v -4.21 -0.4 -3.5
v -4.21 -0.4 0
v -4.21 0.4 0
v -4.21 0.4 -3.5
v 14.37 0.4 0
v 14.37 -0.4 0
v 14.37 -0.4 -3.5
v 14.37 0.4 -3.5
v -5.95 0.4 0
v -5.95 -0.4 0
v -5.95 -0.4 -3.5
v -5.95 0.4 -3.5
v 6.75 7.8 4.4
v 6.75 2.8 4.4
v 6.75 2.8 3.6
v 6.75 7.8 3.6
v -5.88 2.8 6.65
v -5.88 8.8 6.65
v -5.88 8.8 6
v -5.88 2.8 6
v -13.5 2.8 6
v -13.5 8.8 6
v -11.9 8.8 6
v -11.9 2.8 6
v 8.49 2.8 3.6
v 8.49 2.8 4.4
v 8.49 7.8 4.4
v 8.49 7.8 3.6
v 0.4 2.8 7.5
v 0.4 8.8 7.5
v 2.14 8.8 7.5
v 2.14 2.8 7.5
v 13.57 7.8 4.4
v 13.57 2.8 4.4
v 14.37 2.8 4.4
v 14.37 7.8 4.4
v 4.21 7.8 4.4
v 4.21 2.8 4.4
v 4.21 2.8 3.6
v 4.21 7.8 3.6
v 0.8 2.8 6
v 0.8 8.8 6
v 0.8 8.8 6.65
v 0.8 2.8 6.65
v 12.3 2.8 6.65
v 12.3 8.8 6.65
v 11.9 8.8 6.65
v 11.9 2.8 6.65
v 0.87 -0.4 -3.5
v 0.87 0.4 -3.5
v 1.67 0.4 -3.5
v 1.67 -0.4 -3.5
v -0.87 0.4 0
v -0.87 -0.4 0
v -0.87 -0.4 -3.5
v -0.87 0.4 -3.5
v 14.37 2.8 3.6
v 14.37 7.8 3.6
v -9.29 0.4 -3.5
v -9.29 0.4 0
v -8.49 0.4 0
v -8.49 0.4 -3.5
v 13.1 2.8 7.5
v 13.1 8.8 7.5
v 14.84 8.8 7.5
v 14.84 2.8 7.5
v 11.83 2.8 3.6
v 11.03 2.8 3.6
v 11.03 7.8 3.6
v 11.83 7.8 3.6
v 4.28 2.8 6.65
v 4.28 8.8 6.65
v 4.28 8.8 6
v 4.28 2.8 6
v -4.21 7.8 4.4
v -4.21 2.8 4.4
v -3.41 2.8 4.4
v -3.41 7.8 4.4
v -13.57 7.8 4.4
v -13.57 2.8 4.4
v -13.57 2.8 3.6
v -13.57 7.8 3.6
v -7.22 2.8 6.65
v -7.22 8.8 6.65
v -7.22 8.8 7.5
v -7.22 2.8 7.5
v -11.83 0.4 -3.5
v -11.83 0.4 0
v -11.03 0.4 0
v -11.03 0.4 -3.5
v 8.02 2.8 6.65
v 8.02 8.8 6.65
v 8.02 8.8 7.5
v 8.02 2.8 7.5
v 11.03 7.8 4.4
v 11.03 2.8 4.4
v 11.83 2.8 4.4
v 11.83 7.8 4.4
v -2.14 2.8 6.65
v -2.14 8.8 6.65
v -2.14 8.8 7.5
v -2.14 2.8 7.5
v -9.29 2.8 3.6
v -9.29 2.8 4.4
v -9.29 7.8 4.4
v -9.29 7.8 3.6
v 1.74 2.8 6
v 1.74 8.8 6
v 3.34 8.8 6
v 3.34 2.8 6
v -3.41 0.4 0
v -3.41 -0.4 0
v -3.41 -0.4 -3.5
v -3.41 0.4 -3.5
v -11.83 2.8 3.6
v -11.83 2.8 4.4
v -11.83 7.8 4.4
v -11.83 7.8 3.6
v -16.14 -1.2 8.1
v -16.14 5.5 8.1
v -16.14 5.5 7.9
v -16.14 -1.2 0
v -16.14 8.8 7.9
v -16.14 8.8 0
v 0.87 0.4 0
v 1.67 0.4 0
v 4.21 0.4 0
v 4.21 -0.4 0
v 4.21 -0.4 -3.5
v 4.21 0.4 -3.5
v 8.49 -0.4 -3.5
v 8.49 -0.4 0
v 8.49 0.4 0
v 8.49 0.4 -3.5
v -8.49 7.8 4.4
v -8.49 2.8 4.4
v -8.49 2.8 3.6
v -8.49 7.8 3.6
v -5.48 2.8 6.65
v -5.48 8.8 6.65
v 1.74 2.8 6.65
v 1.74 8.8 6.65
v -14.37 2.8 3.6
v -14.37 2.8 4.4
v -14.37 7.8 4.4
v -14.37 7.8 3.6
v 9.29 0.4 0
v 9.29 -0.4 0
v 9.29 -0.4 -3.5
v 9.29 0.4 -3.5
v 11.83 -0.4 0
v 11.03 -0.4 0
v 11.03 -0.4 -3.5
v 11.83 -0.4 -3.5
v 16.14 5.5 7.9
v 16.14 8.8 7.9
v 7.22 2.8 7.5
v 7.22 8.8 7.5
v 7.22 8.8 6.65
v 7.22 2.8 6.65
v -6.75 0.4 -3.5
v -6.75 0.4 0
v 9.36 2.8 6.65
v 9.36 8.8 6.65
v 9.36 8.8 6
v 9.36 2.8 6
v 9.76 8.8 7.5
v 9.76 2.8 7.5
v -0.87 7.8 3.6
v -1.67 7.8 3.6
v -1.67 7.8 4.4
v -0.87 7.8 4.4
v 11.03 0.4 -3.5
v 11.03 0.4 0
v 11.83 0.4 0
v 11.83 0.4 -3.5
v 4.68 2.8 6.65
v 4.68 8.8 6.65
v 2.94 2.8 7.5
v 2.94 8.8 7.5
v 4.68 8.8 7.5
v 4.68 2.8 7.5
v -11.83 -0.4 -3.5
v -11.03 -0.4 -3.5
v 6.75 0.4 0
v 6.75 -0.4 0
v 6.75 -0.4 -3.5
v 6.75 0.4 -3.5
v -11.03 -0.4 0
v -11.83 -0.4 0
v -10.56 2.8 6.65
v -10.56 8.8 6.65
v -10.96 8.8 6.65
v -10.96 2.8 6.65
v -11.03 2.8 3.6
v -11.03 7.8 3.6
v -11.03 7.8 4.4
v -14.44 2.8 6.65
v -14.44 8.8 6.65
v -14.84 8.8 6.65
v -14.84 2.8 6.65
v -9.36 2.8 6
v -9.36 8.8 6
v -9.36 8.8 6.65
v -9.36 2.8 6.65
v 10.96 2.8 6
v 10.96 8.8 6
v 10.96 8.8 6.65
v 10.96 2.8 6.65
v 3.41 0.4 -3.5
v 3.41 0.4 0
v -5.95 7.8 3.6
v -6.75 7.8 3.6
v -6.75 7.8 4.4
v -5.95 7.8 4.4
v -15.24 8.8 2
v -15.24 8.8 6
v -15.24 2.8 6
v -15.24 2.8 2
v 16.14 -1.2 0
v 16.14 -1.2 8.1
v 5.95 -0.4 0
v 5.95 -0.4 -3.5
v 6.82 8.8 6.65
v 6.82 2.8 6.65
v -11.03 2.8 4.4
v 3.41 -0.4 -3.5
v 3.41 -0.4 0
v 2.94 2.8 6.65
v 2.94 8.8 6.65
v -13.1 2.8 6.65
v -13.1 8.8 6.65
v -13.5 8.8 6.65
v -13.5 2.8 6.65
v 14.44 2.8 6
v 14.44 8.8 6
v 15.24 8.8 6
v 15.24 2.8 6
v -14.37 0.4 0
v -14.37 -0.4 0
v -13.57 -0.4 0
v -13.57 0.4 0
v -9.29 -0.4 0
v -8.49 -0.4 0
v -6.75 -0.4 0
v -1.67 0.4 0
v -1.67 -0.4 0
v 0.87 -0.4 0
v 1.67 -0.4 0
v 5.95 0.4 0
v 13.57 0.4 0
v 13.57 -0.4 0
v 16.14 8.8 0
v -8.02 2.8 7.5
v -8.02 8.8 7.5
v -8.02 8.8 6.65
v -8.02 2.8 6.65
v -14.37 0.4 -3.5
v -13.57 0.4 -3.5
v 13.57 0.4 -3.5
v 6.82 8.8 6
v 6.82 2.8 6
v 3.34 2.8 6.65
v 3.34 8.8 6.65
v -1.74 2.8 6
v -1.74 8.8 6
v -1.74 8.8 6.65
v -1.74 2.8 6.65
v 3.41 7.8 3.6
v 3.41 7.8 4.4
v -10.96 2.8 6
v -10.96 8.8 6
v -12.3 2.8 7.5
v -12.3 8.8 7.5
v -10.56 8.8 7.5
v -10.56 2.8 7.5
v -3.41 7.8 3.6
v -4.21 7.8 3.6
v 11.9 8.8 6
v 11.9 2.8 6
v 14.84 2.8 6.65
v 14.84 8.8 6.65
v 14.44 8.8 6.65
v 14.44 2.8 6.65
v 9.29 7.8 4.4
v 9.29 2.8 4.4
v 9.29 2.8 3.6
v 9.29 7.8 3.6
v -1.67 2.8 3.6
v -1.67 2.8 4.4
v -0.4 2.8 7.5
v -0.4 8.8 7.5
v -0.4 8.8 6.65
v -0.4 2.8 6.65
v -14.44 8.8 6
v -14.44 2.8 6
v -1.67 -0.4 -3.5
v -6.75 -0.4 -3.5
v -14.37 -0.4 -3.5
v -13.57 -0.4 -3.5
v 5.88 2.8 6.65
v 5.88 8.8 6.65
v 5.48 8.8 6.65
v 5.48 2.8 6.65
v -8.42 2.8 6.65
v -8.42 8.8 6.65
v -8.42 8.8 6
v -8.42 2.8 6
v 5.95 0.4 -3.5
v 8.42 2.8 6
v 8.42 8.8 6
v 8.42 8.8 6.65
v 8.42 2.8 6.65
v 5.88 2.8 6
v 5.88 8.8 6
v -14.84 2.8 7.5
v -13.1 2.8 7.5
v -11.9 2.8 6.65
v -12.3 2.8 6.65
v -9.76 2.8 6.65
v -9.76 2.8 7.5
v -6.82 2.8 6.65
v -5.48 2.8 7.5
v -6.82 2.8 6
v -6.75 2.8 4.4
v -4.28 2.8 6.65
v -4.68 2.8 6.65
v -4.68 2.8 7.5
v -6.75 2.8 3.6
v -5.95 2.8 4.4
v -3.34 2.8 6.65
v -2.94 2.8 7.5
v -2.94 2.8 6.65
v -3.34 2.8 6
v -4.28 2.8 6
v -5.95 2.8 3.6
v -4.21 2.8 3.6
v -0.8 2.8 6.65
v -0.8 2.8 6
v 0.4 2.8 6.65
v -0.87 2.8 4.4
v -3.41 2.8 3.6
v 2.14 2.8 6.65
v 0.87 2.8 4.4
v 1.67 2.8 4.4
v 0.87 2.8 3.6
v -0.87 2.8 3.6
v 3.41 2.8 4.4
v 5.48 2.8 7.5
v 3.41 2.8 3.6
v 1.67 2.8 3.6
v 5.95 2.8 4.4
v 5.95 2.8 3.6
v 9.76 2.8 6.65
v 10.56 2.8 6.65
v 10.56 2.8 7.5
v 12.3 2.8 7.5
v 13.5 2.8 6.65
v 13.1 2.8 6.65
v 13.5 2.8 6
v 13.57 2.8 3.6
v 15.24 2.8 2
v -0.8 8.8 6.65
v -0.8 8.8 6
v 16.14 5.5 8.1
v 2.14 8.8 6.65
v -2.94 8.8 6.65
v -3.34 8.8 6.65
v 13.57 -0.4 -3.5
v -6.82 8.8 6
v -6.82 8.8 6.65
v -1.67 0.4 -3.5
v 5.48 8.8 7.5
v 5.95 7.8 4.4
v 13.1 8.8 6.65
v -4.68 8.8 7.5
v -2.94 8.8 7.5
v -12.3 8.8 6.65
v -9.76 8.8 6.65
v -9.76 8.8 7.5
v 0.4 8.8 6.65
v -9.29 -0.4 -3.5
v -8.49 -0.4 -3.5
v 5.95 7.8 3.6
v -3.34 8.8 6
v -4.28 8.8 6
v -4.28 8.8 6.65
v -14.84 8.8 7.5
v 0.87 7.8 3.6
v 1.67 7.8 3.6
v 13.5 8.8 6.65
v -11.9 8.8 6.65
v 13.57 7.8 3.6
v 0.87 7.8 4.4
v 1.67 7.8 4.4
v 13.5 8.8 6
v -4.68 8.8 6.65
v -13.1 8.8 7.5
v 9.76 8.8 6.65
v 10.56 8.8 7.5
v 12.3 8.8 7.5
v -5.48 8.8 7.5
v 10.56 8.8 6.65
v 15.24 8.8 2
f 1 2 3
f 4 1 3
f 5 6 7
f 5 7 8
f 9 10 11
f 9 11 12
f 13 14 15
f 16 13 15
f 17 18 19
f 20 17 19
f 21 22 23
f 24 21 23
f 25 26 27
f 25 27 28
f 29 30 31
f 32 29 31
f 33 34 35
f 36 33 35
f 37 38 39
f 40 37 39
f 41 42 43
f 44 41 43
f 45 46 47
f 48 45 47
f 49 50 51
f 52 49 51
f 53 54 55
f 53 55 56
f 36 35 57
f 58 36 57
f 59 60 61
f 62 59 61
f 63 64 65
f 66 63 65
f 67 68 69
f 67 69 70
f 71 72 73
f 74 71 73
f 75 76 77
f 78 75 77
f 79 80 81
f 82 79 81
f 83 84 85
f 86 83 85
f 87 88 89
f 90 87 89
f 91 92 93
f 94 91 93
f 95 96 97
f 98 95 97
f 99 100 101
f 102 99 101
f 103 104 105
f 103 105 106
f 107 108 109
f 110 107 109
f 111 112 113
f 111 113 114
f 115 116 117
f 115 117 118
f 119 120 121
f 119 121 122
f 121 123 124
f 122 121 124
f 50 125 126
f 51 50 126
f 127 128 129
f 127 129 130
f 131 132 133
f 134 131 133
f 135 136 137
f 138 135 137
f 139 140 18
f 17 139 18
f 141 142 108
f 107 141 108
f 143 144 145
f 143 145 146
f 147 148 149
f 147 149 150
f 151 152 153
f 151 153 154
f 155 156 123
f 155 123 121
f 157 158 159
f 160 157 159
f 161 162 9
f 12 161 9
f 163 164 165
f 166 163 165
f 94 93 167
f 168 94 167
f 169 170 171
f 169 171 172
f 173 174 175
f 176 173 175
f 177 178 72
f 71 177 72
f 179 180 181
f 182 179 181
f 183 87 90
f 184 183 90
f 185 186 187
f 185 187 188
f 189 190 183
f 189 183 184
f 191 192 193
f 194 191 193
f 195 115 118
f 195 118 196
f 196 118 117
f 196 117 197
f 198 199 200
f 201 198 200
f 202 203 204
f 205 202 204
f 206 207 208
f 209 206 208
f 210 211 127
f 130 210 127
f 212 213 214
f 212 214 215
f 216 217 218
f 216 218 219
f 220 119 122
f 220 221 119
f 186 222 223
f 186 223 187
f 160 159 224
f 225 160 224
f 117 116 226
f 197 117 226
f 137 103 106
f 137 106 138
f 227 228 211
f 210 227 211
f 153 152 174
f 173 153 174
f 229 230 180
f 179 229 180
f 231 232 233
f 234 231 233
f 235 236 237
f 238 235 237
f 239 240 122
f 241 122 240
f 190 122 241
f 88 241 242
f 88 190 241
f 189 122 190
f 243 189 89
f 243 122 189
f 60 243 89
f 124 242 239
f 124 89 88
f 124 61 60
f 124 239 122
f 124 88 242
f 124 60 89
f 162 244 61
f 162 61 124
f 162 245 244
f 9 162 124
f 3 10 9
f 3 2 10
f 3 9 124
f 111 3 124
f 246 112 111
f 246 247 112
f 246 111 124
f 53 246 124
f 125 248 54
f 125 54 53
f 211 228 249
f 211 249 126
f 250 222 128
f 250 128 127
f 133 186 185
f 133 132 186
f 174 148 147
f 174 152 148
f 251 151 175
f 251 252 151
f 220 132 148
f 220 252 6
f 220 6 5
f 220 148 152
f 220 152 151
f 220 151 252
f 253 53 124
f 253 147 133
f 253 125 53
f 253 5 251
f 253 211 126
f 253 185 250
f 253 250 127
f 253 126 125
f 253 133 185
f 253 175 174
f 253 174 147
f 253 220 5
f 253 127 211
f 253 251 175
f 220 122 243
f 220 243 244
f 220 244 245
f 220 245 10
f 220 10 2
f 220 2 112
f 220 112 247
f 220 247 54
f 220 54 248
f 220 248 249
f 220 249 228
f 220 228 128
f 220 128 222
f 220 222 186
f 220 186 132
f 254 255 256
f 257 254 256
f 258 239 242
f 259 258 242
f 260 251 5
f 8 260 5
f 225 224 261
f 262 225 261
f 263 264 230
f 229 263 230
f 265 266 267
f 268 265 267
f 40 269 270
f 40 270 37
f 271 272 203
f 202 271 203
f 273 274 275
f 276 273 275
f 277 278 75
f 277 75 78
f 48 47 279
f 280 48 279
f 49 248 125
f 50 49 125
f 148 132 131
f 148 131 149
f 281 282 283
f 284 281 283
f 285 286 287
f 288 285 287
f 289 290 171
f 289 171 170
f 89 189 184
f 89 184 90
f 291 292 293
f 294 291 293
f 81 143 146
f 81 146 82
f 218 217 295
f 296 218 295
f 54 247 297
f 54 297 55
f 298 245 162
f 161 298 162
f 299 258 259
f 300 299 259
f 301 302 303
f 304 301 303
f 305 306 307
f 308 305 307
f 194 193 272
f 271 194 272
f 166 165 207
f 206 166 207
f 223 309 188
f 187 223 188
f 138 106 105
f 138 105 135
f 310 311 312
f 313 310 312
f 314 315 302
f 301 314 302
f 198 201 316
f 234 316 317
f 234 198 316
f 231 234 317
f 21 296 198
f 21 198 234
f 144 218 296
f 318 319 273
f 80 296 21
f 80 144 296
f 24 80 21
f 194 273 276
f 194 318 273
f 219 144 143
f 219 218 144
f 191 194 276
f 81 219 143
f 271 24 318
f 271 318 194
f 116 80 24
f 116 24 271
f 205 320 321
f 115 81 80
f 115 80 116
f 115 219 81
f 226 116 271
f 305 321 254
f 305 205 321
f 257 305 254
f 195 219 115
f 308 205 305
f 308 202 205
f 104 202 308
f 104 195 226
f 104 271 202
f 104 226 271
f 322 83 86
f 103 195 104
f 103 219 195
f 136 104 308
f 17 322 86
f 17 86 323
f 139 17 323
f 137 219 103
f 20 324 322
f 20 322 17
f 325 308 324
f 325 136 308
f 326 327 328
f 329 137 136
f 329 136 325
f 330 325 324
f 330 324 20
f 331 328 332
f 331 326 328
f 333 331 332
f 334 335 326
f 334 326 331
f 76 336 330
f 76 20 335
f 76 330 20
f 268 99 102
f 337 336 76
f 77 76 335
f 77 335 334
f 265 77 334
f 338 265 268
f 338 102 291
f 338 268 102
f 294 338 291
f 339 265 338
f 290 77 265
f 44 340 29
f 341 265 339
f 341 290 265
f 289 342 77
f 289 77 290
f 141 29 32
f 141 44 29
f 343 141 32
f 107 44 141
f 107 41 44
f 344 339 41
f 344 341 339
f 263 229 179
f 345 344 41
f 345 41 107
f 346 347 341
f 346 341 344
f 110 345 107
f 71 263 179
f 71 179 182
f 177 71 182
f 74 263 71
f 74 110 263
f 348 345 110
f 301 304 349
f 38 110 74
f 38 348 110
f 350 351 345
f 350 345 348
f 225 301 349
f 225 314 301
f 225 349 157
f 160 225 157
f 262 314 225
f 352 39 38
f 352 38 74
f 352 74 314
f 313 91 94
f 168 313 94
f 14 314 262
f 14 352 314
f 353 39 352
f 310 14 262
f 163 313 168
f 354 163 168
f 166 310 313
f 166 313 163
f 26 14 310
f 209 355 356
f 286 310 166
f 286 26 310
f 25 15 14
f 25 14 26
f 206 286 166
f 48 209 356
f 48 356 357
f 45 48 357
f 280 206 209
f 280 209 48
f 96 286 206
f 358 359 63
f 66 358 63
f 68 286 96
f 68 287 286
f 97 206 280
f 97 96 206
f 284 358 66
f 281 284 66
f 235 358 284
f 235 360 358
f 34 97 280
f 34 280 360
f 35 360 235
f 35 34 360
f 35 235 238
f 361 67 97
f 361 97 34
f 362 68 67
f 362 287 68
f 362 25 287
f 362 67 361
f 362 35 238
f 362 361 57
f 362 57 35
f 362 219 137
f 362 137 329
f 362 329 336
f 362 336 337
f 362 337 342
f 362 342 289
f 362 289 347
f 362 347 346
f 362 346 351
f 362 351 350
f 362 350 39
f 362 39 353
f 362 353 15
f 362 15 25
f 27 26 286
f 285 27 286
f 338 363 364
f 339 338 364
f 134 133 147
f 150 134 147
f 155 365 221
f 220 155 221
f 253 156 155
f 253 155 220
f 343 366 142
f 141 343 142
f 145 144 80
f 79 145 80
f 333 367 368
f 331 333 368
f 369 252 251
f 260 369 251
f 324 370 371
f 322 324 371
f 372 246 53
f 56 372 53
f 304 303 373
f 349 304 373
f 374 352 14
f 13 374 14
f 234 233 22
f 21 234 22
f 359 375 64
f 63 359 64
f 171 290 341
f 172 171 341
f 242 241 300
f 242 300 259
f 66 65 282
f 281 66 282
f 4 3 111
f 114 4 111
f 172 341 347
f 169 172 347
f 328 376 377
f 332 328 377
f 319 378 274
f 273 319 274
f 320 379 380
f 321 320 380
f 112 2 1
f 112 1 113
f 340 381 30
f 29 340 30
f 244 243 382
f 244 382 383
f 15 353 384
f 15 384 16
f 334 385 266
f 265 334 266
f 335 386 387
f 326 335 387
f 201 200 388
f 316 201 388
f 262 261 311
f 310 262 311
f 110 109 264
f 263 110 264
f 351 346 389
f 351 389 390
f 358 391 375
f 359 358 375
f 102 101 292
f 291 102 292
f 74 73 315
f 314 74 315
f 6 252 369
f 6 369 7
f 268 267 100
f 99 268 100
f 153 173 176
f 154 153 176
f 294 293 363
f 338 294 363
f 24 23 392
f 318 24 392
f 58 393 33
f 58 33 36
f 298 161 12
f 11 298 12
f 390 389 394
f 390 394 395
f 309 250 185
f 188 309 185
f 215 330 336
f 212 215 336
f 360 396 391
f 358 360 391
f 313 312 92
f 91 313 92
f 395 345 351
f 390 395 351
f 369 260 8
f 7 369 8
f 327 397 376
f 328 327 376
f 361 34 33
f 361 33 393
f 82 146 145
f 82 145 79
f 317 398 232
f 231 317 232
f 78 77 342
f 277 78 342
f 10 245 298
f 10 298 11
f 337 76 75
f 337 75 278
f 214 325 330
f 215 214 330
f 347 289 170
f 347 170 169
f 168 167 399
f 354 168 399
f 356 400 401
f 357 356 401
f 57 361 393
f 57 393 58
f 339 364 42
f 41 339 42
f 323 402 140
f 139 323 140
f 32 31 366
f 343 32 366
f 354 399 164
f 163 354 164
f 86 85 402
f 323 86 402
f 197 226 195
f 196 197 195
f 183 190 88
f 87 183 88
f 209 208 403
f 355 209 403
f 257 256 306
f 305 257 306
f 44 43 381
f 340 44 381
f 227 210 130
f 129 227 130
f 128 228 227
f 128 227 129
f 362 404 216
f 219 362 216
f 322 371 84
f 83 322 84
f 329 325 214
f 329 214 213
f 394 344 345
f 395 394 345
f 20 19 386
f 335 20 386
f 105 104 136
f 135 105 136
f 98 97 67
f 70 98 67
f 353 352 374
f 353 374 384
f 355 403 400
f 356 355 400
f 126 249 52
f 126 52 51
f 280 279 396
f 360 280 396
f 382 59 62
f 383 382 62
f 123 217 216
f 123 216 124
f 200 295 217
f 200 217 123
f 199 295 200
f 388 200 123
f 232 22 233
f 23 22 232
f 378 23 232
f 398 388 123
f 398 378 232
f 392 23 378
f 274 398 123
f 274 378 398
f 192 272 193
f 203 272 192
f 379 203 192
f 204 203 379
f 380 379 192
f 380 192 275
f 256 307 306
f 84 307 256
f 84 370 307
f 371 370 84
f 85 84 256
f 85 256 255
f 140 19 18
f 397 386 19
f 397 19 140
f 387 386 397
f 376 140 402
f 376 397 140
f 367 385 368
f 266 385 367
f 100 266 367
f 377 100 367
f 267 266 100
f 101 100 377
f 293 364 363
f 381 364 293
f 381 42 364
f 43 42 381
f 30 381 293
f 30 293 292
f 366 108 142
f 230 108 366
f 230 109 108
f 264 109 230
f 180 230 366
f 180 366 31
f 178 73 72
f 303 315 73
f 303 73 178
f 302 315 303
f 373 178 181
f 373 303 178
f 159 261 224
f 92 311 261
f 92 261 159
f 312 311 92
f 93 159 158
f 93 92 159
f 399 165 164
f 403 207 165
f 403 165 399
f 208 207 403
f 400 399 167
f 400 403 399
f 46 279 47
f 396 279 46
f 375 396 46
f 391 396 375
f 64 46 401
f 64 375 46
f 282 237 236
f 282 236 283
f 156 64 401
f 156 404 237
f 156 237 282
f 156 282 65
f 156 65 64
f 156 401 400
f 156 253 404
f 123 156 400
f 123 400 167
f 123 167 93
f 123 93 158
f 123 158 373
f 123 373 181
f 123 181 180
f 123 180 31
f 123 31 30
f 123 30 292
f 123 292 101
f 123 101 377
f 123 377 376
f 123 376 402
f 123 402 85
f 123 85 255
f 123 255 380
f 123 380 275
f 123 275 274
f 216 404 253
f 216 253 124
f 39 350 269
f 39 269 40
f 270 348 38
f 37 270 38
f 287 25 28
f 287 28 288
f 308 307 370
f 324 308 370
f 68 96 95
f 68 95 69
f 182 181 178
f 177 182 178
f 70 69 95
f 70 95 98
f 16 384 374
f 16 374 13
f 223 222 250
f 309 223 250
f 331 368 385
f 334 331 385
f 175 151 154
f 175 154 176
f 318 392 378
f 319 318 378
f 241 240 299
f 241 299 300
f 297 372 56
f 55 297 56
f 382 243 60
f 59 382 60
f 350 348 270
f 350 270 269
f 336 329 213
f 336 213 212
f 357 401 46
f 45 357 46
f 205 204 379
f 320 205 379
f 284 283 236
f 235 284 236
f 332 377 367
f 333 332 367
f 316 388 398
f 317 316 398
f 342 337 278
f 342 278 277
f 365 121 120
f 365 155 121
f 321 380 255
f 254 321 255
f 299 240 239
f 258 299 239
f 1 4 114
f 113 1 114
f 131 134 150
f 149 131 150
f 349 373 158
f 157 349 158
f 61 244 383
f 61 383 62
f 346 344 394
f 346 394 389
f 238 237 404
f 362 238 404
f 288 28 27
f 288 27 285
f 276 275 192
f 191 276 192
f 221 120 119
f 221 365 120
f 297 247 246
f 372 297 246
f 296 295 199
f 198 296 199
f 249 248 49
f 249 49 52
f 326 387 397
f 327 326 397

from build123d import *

# Parameters (mm, degrees)
SKETCH1_W           = 2.54
SKETCH1_H           = 10
BOSS_EXTRUDE1_DEPTH = 8.1
SKETCH1_3_W         = 0.8
SKETCH1_3_H         = 0.8
BOSS_EXTRUDE2_DEPTH = 3.5
SKETCH2_W           = 2.54
SKETCH2_H           = 3.3
CUT_EXTRUDE1_DEPTH  = 0.2
CUT_EXTRUDE2_DEPTH  = 6
SKETCH4_W           = 0.8
SKETCH4_H           = 0.8
BOSS_EXTRUDE3_DEPTH = 5
LPATTERN1_COUNT     = 12
LPATTERN1_PITCH     = 2.54
BOSS_EXTRUDE4_DEPTH = 0.9
BOSS_EXTRUDE5_START = -30.48
BOSS_EXTRUDE5_DEPTH = 0.9


with BuildPart() as part:
    # Sketch1 → Boss-Extrude1 (new body)
    with BuildSketch(Plane.XY):
        with Locations((13.97, 3.8)):
            Rectangle(SKETCH1_W, SKETCH1_H)
    extrude(amount=BOSS_EXTRUDE1_DEPTH)

    # Sketch1<3> → Boss-Extrude2 (add)
    with BuildSketch(Plane.XY):
        with Locations((13.97, 0)):
            Rectangle(SKETCH1_3_W, SKETCH1_3_H)
    extrude(amount=-BOSS_EXTRUDE2_DEPTH)

    # Sketch2 → Cut-Extrude1 (cut)
    with BuildSketch(Plane.XY.offset(8.1)):
        with Locations((13.97, 7.15)):
            Rectangle(SKETCH2_W, SKETCH2_H)
    extrude(amount=-CUT_EXTRUDE1_DEPTH, mode=Mode.SUBTRACT)

    # Sketch3 → Cut-Extrude2 (cut)
    with BuildSketch(Plane(origin=(0, 8.8, 0), x_dir=(1, 0, 0), z_dir=(0, 1, 0))):
        Polygon((15.24, -2), (12.7, -2), (12.7, -6), (13.5, -6), (13.5, -6.65), (13.1, -6.65), (13.1, -7.5), (14.84, -7.5), (14.84, -6.65), (14.44, -6.65), (14.44, -6), (15.24, -6), align=None)
    extrude(amount=-CUT_EXTRUDE2_DEPTH, mode=Mode.SUBTRACT)

    # Sketch4 → Boss-Extrude3 (add)
    with BuildSketch(Plane(origin=(0, 2.8, 0), x_dir=(1, 0, 0), z_dir=(0, 1, 0))):
        with Locations((13.97, -4)):
            Rectangle(SKETCH4_W, SKETCH4_H)
    extrude(amount=BOSS_EXTRUDE3_DEPTH)


with BuildPart() as lpattern1_1:
    # LPattern1: pattern copy
    add(part.part.moved(Location(Vector(-1, 0, 0) * (1 * LPATTERN1_PITCH))))


with BuildPart() as lpattern1_2:
    # LPattern1: pattern copy
    add(part.part.moved(Location(Vector(-1, 0, 0) * (2 * LPATTERN1_PITCH))))


with BuildPart() as lpattern1_3:
    # LPattern1: pattern copy
    add(part.part.moved(Location(Vector(-1, 0, 0) * (3 * LPATTERN1_PITCH))))


with BuildPart() as lpattern1_4:
    # LPattern1: pattern copy
    add(part.part.moved(Location(Vector(-1, 0, 0) * (4 * LPATTERN1_PITCH))))


with BuildPart() as lpattern1_5:
    # LPattern1: pattern copy
    add(part.part.moved(Location(Vector(-1, 0, 0) * (5 * LPATTERN1_PITCH))))


with BuildPart() as lpattern1_6:
    # LPattern1: pattern copy
    add(part.part.moved(Location(Vector(-1, 0, 0) * (6 * LPATTERN1_PITCH))))


with BuildPart() as lpattern1_7:
    # LPattern1: pattern copy
    add(part.part.moved(Location(Vector(-1, 0, 0) * (7 * LPATTERN1_PITCH))))


with BuildPart() as lpattern1_8:
    # LPattern1: pattern copy
    add(part.part.moved(Location(Vector(-1, 0, 0) * (8 * LPATTERN1_PITCH))))


with BuildPart() as lpattern1_9:
    # LPattern1: pattern copy
    add(part.part.moved(Location(Vector(-1, 0, 0) * (9 * LPATTERN1_PITCH))))


with BuildPart() as lpattern1_10:
    # LPattern1: pattern copy
    add(part.part.moved(Location(Vector(-1, 0, 0) * (10 * LPATTERN1_PITCH))))


with BuildPart() as lpattern1_11:
    # LPattern1: pattern copy
    add(part.part.moved(Location(Vector(-1, 0, 0) * (11 * LPATTERN1_PITCH))))


with BuildPart() as part_1:
    add(part.part)

    # Sketch5 → Boss-Extrude4 (add)
    with BuildSketch(Plane(origin=(15.24, 0, 0), x_dir=(0, 0, -1), z_dir=(1, 0, 0))):
        Polygon((-8.1, -1.2), (0, -1.2), (0, 8.8), (-7.9, 8.8), (-7.9, 5.5), (-8.1, 5.5), align=None)
    extrude(amount=BOSS_EXTRUDE4_DEPTH)


with BuildPart() as body_13:
    # Sketch5<2> → Boss-Extrude5 (new body)
    with BuildSketch(Plane(origin=(15.24, 0, 0), x_dir=(0, 0, -1), z_dir=(1, 0, 0)).offset(BOSS_EXTRUDE5_START)):
        Polygon((-8.1, -1.2), (0, -1.2), (0, 8.8), (-7.9, 8.8), (-7.9, 5.5), (-8.1, 5.5), align=None)
    extrude(amount=-BOSS_EXTRUDE5_DEPTH)


with BuildPart() as lpattern1_1_1:
    add(lpattern1_1.part)

    # Combine1: union LPattern1_2, LPattern1_3, LPattern1_4, LPattern1_5, LPattern1_6, LPattern1_7, LPattern1_8, LPattern1_9, LPattern1_10, LPattern1_11, part, body 13
    add(lpattern1_2.part)
    add(lpattern1_3.part)
    add(lpattern1_4.part)
    add(lpattern1_5.part)
    add(lpattern1_6.part)
    add(lpattern1_7.part)
    add(lpattern1_8.part)
    add(lpattern1_9.part)
    add(lpattern1_10.part)
    add(lpattern1_11.part)
    add(part_1.part)
    add(body_13.part)


solid = lpattern1_1_1.part
